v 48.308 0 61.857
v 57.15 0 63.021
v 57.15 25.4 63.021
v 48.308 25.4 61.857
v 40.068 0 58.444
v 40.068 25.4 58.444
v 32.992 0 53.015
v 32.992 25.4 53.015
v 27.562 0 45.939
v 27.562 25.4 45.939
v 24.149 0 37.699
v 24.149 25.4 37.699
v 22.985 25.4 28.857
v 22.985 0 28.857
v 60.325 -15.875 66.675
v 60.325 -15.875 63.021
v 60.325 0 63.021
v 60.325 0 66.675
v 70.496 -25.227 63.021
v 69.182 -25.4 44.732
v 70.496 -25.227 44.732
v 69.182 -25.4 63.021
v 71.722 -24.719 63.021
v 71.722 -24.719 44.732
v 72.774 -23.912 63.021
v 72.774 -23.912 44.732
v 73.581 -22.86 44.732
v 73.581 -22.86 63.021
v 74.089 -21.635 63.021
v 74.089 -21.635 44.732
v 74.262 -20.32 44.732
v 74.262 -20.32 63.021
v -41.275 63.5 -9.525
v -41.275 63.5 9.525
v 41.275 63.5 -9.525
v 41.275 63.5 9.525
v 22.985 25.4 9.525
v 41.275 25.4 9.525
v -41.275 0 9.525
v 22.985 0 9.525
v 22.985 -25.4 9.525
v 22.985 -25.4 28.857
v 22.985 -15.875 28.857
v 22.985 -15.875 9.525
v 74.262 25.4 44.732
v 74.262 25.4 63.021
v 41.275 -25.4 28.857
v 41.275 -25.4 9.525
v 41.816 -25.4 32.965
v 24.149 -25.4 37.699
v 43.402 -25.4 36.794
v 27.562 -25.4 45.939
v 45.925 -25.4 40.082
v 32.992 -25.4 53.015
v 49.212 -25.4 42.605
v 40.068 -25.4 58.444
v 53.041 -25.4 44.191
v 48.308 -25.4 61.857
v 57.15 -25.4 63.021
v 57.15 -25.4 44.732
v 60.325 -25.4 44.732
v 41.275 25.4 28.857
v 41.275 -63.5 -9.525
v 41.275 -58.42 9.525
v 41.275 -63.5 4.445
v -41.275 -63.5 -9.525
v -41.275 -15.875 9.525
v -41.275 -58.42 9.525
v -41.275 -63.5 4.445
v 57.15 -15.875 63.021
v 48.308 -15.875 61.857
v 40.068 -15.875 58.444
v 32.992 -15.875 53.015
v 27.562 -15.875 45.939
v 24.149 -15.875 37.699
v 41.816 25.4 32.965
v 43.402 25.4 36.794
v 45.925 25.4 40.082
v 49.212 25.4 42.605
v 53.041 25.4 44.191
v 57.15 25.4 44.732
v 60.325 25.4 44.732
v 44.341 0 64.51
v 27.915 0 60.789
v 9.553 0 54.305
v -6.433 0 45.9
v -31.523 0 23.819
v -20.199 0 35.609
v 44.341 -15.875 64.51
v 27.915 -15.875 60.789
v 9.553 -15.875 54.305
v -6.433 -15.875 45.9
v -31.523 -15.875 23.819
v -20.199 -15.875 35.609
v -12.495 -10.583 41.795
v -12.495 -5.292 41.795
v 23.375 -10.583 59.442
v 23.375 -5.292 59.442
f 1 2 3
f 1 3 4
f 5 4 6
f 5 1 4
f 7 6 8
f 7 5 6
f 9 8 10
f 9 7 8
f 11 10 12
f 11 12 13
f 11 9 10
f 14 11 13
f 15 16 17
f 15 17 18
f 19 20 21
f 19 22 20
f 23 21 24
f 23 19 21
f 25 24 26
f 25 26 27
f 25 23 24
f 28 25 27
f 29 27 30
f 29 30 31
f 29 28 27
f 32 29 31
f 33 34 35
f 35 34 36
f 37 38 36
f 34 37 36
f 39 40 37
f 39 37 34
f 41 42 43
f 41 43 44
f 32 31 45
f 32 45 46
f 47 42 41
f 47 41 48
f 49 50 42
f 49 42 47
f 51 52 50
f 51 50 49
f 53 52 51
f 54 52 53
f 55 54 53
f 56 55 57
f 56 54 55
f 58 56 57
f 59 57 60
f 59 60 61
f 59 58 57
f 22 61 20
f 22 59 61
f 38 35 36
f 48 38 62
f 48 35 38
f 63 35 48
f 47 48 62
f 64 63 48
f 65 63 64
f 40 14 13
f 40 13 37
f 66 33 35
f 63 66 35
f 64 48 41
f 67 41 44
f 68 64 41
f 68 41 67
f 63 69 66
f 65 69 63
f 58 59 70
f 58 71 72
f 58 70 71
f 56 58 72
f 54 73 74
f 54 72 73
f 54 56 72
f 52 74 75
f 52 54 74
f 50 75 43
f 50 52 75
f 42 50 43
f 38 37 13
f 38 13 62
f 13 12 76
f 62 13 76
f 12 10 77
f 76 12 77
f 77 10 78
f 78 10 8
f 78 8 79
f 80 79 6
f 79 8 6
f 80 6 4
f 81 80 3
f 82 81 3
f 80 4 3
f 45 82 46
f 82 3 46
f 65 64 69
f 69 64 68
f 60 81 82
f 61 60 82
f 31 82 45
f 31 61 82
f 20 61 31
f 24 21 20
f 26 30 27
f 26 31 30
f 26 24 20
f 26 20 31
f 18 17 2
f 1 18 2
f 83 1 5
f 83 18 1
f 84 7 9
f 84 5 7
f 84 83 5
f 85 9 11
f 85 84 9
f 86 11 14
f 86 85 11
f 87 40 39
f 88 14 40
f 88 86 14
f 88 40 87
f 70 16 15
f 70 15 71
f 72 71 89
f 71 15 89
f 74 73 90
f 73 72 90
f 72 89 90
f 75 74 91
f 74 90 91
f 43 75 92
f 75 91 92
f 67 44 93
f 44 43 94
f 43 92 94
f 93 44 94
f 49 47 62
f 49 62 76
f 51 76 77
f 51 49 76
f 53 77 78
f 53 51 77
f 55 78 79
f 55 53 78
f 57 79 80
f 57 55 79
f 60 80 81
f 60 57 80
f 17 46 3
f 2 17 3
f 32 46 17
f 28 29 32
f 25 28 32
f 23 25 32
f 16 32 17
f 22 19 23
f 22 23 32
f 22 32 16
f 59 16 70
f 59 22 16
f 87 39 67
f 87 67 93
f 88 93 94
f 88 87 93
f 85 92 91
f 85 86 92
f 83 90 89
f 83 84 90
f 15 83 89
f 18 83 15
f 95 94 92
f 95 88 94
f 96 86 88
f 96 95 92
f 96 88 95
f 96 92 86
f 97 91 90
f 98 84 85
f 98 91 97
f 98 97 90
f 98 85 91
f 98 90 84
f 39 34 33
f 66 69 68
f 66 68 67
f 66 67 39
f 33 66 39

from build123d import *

# Parameters (mm, degrees)
F1_DEPTH = 63.5
F0_W     = 13.9366841115
F0_H     = 18.2897937342
F2_DEPTH = 25.4
F3_DEPTH = 15.875
F4_SIZE  = 5.08
F5_R     = 5.08


with BuildPart() as f1:
    # F0 (on Front) → F1 (new body, symmetric)
    with BuildSketch(Plane.XZ):
        Polygon((22.9852062658, 9.525), (-41.275, 9.525), (-41.275, -9.525), (41.275, -9.525), (41.275, 9.525), align=None)
    extrude(amount=F1_DEPTH, both=True)

    # F0 (on Front) → F2 (join, symmetric)
    with BuildSketch(Plane.XZ):
        with BuildLine():
            Line((22.9852062658, 28.8565382361), (22.9852062658, 9.525))
            Line((22.9852062658, 9.525), (41.275, 9.525))
            Line((41.275, 9.525), (41.275, 28.8565382361))
            ThreePointArc((41.275, 28.8565382361), (45.9246798487, 40.0818583875), (57.15, 44.7315382361))
            Line((57.15, 44.7315382361), (60.325, 44.7315382361))
            Line((60.325, 44.7315382361), (60.325, 63.0213319704))
            Line((60.325, 63.0213319704), (57.15, 63.0213319704))
            ThreePointArc((57.15, 63.0213319704), (32.9918426727, 53.0146955635), (22.9852062658, 28.8565382361))
        make_face()
        with Locations((67.2933420557, 53.8764351033)):
            Rectangle(F0_W, F0_H)
    extrude(amount=F2_DEPTH, both=True)

    # F0 (on Front) → F3 (join)
    with BuildSketch(Plane.XZ):
        with BuildLine():
            add(Edge.make_bspline(
                [(-41.275, 9.525), (-18.0427934974, 50.5091771483), (24.8379260302, 63.2460191846), (60.325, 66.675)],
                knots=[0, 0, 0, 0, 116.5705044169, 116.5705044169, 116.5705044169, 116.5705044169], degree=3))
            Line((-41.275, 9.525), (22.9852062658, 9.525))
            Line((22.9852062658, 9.525), (22.9852062658, 28.8565382361))
            ThreePointArc((22.9852062658, 28.8565382361), (32.9918426727, 53.0146955635), (57.15, 63.0213319704))
            Line((57.15, 63.0213319704), (60.325, 63.0213319704))
            Line((60.325, 63.0213319704), (60.325, 66.675))
        make_face()
    extrude(amount=F3_DEPTH)

    # F4
    f4_edges = [f1.edges().sort_by_distance(p)[0] for p in [
        (0, -63.5, 9.525),
    ]]
    chamfer(f4_edges, length=F4_SIZE)

    # F5
    f5_edges = [f1.edges().sort_by_distance(p)[0] for p in [
        (74.261684, -25.4, 53.876435),
    ]]
    fillet(f5_edges, radius=F5_R)


solid = f1.part
